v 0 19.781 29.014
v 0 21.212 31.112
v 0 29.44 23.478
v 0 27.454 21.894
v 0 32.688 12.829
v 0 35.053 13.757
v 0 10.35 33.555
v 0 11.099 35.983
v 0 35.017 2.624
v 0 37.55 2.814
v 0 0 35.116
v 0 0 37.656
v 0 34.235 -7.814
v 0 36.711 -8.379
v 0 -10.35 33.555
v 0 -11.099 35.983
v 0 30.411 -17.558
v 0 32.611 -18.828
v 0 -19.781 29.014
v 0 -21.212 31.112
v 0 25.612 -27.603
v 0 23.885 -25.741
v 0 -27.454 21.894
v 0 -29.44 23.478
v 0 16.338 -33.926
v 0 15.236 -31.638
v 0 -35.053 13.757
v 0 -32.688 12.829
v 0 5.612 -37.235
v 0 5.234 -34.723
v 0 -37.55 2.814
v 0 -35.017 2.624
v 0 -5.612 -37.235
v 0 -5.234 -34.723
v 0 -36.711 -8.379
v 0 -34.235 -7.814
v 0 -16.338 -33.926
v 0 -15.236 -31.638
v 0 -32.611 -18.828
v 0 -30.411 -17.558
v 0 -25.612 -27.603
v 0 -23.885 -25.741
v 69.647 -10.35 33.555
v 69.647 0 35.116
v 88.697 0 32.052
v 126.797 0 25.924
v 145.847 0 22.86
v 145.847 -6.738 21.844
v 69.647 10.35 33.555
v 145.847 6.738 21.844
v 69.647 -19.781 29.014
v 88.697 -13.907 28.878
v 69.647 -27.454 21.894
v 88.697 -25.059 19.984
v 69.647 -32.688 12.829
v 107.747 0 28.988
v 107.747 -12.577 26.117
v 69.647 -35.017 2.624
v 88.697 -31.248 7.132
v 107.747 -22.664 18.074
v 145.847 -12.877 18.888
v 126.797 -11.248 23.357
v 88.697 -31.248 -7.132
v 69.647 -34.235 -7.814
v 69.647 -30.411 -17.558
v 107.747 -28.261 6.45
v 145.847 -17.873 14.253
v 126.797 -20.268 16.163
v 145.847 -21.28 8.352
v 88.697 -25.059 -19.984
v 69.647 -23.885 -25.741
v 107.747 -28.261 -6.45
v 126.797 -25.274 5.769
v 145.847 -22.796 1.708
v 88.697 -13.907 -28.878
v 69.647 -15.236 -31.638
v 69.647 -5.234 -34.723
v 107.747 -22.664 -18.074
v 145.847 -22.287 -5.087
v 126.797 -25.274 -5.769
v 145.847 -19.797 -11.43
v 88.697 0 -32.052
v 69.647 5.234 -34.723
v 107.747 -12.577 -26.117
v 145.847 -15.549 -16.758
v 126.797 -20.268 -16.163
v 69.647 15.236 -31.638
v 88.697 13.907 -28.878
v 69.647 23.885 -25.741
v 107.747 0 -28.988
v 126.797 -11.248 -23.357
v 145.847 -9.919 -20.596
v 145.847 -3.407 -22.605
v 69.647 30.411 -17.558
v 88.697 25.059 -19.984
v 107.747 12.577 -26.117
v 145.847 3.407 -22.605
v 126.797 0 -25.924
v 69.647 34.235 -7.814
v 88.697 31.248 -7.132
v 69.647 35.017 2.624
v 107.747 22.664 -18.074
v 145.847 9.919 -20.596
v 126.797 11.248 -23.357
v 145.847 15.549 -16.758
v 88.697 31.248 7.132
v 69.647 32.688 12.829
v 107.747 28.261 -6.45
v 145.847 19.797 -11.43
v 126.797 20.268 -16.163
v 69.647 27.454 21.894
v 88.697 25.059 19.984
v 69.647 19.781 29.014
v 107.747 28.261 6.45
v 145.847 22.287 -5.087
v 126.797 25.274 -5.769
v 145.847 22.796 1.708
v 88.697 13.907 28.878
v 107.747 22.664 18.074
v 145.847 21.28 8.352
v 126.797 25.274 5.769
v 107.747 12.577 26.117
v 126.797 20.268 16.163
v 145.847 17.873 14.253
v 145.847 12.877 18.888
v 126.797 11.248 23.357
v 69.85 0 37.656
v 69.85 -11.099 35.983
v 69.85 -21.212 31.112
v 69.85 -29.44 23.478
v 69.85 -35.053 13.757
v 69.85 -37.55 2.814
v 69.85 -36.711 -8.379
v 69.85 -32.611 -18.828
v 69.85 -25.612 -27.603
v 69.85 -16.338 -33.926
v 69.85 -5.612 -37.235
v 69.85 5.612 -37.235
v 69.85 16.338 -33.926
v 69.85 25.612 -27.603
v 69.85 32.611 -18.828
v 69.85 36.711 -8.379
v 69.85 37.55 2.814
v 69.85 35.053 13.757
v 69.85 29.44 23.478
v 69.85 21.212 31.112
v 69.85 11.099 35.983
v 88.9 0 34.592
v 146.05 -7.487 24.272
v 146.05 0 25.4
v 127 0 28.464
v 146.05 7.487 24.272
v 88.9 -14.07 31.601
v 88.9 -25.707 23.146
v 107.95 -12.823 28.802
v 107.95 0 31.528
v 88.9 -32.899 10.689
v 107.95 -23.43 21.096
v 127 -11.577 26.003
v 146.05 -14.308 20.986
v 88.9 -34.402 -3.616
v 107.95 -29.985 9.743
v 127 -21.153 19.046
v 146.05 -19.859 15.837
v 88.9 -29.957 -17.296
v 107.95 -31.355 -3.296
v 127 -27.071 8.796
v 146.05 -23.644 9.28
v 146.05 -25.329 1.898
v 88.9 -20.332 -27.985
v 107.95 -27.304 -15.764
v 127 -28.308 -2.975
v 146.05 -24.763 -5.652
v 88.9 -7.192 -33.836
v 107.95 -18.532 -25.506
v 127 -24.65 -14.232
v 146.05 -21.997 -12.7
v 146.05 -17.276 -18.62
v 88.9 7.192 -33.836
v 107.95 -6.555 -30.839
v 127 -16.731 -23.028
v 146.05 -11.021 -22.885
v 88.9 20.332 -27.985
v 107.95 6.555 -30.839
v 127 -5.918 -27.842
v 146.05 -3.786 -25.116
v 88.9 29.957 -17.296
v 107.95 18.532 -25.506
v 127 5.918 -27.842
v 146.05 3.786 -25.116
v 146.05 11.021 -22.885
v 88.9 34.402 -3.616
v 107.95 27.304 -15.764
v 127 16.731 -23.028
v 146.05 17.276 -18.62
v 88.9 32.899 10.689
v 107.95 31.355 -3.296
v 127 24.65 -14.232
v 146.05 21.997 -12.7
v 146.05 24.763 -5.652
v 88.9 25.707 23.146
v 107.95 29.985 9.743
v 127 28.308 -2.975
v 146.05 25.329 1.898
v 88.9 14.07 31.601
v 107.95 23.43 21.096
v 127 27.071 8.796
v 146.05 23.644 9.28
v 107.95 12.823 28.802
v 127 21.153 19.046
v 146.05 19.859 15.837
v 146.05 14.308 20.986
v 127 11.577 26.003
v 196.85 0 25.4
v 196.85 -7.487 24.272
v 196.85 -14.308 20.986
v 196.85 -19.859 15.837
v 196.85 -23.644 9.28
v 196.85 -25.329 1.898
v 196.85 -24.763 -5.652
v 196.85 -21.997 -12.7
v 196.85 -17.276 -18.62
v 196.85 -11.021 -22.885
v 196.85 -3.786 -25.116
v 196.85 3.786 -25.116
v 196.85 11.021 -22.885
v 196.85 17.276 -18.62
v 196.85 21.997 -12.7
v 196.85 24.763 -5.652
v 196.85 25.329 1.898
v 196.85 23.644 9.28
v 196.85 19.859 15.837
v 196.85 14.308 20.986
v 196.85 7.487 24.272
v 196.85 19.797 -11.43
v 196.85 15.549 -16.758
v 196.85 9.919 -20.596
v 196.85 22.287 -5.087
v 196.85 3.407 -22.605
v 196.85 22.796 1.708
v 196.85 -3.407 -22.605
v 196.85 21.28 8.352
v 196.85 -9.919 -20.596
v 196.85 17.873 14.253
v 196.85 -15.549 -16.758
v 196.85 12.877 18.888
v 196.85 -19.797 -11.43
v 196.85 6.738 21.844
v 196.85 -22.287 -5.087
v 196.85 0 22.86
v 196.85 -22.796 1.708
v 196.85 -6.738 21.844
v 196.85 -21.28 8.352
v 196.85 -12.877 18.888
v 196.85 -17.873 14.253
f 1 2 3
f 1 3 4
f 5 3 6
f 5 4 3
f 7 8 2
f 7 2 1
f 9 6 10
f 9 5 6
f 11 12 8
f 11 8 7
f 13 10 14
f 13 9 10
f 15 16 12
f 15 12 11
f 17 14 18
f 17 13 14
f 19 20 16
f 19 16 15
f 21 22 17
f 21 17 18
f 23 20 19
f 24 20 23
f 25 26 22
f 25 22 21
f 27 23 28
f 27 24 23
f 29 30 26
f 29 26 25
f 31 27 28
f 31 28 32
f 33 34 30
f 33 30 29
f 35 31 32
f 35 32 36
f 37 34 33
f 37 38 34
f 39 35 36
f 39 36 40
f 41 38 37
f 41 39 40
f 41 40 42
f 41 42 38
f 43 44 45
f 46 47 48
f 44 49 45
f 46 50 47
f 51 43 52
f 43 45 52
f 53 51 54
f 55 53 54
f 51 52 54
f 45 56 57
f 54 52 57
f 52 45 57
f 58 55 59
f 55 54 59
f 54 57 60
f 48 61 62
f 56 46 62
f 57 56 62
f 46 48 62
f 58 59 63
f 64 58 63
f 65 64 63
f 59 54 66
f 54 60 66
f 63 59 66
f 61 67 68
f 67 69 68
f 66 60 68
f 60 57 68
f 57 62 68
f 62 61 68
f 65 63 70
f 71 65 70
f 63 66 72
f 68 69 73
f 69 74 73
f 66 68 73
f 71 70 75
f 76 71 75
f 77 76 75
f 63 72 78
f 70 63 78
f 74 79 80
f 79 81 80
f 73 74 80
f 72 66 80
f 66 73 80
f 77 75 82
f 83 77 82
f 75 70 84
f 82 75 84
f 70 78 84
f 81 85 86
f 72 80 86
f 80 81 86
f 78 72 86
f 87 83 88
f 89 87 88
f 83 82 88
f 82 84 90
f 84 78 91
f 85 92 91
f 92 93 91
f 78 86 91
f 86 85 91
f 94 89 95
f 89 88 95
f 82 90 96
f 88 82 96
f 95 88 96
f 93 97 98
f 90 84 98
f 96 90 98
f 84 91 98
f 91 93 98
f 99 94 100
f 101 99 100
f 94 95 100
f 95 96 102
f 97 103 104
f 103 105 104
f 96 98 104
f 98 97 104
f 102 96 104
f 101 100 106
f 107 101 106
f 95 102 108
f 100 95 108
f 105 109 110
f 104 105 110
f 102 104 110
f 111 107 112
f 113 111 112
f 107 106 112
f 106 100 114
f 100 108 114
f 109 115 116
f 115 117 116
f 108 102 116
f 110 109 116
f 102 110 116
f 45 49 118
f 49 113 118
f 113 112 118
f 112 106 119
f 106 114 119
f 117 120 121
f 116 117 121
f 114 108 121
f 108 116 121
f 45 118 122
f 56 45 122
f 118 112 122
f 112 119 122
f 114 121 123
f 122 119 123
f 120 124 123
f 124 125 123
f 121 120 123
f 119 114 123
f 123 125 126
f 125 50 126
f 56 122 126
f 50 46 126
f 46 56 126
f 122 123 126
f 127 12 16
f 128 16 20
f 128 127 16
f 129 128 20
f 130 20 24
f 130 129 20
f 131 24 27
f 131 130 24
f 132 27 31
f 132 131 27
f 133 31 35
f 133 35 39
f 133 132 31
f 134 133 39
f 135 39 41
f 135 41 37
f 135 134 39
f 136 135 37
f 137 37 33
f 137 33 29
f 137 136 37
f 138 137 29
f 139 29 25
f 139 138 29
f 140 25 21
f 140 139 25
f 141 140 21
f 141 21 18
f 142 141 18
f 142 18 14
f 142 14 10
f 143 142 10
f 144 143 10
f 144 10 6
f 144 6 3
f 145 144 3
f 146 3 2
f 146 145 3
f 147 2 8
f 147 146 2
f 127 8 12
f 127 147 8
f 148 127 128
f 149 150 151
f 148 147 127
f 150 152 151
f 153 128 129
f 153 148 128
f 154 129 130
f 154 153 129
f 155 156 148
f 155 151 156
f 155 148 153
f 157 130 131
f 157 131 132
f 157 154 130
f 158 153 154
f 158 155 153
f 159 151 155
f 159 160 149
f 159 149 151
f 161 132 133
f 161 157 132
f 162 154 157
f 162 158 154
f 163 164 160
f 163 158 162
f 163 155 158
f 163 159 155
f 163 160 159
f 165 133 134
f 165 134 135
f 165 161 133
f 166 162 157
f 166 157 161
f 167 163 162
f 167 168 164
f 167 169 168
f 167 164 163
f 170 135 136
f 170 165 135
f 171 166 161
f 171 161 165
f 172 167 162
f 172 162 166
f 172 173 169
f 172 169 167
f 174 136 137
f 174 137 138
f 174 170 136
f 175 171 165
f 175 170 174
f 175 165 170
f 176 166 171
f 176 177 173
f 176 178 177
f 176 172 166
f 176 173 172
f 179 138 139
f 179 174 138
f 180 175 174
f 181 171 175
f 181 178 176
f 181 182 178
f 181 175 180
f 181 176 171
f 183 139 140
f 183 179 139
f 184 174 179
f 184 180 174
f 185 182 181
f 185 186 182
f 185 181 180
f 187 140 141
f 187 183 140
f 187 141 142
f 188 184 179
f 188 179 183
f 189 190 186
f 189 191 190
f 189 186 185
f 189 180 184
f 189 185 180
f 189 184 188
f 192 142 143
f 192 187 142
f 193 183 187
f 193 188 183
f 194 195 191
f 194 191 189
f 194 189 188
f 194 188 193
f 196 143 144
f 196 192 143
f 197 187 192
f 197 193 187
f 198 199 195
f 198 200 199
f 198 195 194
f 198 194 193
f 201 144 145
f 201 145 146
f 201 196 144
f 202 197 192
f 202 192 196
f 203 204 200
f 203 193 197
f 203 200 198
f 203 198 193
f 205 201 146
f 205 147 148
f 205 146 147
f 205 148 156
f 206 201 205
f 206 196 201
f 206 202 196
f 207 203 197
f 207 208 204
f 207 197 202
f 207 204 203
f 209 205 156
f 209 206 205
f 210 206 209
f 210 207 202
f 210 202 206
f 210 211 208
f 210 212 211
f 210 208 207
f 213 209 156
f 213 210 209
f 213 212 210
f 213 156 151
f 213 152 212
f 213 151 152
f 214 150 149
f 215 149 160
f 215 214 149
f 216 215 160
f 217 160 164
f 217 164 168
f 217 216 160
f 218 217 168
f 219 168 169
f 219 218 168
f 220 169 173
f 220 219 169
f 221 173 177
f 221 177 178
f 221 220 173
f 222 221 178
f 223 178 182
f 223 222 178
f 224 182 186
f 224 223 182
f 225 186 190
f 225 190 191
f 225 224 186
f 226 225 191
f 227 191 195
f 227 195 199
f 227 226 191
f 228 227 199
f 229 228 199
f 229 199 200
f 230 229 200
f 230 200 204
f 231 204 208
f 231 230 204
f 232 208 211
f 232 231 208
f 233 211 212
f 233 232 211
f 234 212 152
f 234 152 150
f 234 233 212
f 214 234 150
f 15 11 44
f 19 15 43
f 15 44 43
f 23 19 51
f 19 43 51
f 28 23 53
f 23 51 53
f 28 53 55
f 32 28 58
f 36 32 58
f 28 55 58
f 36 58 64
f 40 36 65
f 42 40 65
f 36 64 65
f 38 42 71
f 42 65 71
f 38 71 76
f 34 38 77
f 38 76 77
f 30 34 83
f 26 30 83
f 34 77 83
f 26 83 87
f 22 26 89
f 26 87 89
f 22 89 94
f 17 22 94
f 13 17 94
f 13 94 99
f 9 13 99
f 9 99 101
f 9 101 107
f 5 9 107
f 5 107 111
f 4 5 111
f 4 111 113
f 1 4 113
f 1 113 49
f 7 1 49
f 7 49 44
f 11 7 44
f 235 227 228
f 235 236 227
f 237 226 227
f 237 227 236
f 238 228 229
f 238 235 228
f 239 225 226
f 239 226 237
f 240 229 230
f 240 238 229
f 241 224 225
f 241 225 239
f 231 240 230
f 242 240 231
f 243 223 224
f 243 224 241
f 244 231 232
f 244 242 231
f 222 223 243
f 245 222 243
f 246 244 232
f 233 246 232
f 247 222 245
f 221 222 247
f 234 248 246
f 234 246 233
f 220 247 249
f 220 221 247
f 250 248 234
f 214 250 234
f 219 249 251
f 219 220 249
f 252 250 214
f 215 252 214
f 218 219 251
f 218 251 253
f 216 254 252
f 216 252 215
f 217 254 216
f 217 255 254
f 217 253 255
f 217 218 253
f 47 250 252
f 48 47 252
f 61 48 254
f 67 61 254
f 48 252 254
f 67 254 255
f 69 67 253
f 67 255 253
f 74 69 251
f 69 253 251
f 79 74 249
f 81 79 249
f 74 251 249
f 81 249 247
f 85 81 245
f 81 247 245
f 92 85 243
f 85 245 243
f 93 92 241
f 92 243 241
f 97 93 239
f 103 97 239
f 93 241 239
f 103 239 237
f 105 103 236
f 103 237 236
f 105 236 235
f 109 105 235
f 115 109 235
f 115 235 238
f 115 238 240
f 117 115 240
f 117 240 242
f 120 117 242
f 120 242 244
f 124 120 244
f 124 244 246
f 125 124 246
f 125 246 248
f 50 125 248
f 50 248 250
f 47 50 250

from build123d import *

# Parameters (mm, degrees)
SHELL1_T = -2.54


with BuildPart() as part:
    # Sketch1 → Revolve1 (revolve)
    with BuildSketch(Plane(origin=(0, 0, 0), x_dir=(1, 0, 0), z_dir=(0, 1, 0)), mode=Mode.PRIVATE) as revolve1_sk:
        Polygon((0, 0), (0, 37.6555), (69.85, 37.6555), (146.05, 25.4), (196.85, 25.4), (196.85, 0), align=None)
    revolve(revolve1_sk.sketch.rotate(Axis((0, 0, 0), (1, 0, 0)), 180), axis=Axis((0, 0, 0), (1, 0, 0)))

    # Shell1
    shell1_openings = [part.faces().sort_by_distance(p)[0] for p in [
        (196.85, 0, 0),
        (0, 0, 0),
    ]]
    offset(amount=SHELL1_T, openings=shell1_openings, kind=Kind.INTERSECTION)


solid = part.part
